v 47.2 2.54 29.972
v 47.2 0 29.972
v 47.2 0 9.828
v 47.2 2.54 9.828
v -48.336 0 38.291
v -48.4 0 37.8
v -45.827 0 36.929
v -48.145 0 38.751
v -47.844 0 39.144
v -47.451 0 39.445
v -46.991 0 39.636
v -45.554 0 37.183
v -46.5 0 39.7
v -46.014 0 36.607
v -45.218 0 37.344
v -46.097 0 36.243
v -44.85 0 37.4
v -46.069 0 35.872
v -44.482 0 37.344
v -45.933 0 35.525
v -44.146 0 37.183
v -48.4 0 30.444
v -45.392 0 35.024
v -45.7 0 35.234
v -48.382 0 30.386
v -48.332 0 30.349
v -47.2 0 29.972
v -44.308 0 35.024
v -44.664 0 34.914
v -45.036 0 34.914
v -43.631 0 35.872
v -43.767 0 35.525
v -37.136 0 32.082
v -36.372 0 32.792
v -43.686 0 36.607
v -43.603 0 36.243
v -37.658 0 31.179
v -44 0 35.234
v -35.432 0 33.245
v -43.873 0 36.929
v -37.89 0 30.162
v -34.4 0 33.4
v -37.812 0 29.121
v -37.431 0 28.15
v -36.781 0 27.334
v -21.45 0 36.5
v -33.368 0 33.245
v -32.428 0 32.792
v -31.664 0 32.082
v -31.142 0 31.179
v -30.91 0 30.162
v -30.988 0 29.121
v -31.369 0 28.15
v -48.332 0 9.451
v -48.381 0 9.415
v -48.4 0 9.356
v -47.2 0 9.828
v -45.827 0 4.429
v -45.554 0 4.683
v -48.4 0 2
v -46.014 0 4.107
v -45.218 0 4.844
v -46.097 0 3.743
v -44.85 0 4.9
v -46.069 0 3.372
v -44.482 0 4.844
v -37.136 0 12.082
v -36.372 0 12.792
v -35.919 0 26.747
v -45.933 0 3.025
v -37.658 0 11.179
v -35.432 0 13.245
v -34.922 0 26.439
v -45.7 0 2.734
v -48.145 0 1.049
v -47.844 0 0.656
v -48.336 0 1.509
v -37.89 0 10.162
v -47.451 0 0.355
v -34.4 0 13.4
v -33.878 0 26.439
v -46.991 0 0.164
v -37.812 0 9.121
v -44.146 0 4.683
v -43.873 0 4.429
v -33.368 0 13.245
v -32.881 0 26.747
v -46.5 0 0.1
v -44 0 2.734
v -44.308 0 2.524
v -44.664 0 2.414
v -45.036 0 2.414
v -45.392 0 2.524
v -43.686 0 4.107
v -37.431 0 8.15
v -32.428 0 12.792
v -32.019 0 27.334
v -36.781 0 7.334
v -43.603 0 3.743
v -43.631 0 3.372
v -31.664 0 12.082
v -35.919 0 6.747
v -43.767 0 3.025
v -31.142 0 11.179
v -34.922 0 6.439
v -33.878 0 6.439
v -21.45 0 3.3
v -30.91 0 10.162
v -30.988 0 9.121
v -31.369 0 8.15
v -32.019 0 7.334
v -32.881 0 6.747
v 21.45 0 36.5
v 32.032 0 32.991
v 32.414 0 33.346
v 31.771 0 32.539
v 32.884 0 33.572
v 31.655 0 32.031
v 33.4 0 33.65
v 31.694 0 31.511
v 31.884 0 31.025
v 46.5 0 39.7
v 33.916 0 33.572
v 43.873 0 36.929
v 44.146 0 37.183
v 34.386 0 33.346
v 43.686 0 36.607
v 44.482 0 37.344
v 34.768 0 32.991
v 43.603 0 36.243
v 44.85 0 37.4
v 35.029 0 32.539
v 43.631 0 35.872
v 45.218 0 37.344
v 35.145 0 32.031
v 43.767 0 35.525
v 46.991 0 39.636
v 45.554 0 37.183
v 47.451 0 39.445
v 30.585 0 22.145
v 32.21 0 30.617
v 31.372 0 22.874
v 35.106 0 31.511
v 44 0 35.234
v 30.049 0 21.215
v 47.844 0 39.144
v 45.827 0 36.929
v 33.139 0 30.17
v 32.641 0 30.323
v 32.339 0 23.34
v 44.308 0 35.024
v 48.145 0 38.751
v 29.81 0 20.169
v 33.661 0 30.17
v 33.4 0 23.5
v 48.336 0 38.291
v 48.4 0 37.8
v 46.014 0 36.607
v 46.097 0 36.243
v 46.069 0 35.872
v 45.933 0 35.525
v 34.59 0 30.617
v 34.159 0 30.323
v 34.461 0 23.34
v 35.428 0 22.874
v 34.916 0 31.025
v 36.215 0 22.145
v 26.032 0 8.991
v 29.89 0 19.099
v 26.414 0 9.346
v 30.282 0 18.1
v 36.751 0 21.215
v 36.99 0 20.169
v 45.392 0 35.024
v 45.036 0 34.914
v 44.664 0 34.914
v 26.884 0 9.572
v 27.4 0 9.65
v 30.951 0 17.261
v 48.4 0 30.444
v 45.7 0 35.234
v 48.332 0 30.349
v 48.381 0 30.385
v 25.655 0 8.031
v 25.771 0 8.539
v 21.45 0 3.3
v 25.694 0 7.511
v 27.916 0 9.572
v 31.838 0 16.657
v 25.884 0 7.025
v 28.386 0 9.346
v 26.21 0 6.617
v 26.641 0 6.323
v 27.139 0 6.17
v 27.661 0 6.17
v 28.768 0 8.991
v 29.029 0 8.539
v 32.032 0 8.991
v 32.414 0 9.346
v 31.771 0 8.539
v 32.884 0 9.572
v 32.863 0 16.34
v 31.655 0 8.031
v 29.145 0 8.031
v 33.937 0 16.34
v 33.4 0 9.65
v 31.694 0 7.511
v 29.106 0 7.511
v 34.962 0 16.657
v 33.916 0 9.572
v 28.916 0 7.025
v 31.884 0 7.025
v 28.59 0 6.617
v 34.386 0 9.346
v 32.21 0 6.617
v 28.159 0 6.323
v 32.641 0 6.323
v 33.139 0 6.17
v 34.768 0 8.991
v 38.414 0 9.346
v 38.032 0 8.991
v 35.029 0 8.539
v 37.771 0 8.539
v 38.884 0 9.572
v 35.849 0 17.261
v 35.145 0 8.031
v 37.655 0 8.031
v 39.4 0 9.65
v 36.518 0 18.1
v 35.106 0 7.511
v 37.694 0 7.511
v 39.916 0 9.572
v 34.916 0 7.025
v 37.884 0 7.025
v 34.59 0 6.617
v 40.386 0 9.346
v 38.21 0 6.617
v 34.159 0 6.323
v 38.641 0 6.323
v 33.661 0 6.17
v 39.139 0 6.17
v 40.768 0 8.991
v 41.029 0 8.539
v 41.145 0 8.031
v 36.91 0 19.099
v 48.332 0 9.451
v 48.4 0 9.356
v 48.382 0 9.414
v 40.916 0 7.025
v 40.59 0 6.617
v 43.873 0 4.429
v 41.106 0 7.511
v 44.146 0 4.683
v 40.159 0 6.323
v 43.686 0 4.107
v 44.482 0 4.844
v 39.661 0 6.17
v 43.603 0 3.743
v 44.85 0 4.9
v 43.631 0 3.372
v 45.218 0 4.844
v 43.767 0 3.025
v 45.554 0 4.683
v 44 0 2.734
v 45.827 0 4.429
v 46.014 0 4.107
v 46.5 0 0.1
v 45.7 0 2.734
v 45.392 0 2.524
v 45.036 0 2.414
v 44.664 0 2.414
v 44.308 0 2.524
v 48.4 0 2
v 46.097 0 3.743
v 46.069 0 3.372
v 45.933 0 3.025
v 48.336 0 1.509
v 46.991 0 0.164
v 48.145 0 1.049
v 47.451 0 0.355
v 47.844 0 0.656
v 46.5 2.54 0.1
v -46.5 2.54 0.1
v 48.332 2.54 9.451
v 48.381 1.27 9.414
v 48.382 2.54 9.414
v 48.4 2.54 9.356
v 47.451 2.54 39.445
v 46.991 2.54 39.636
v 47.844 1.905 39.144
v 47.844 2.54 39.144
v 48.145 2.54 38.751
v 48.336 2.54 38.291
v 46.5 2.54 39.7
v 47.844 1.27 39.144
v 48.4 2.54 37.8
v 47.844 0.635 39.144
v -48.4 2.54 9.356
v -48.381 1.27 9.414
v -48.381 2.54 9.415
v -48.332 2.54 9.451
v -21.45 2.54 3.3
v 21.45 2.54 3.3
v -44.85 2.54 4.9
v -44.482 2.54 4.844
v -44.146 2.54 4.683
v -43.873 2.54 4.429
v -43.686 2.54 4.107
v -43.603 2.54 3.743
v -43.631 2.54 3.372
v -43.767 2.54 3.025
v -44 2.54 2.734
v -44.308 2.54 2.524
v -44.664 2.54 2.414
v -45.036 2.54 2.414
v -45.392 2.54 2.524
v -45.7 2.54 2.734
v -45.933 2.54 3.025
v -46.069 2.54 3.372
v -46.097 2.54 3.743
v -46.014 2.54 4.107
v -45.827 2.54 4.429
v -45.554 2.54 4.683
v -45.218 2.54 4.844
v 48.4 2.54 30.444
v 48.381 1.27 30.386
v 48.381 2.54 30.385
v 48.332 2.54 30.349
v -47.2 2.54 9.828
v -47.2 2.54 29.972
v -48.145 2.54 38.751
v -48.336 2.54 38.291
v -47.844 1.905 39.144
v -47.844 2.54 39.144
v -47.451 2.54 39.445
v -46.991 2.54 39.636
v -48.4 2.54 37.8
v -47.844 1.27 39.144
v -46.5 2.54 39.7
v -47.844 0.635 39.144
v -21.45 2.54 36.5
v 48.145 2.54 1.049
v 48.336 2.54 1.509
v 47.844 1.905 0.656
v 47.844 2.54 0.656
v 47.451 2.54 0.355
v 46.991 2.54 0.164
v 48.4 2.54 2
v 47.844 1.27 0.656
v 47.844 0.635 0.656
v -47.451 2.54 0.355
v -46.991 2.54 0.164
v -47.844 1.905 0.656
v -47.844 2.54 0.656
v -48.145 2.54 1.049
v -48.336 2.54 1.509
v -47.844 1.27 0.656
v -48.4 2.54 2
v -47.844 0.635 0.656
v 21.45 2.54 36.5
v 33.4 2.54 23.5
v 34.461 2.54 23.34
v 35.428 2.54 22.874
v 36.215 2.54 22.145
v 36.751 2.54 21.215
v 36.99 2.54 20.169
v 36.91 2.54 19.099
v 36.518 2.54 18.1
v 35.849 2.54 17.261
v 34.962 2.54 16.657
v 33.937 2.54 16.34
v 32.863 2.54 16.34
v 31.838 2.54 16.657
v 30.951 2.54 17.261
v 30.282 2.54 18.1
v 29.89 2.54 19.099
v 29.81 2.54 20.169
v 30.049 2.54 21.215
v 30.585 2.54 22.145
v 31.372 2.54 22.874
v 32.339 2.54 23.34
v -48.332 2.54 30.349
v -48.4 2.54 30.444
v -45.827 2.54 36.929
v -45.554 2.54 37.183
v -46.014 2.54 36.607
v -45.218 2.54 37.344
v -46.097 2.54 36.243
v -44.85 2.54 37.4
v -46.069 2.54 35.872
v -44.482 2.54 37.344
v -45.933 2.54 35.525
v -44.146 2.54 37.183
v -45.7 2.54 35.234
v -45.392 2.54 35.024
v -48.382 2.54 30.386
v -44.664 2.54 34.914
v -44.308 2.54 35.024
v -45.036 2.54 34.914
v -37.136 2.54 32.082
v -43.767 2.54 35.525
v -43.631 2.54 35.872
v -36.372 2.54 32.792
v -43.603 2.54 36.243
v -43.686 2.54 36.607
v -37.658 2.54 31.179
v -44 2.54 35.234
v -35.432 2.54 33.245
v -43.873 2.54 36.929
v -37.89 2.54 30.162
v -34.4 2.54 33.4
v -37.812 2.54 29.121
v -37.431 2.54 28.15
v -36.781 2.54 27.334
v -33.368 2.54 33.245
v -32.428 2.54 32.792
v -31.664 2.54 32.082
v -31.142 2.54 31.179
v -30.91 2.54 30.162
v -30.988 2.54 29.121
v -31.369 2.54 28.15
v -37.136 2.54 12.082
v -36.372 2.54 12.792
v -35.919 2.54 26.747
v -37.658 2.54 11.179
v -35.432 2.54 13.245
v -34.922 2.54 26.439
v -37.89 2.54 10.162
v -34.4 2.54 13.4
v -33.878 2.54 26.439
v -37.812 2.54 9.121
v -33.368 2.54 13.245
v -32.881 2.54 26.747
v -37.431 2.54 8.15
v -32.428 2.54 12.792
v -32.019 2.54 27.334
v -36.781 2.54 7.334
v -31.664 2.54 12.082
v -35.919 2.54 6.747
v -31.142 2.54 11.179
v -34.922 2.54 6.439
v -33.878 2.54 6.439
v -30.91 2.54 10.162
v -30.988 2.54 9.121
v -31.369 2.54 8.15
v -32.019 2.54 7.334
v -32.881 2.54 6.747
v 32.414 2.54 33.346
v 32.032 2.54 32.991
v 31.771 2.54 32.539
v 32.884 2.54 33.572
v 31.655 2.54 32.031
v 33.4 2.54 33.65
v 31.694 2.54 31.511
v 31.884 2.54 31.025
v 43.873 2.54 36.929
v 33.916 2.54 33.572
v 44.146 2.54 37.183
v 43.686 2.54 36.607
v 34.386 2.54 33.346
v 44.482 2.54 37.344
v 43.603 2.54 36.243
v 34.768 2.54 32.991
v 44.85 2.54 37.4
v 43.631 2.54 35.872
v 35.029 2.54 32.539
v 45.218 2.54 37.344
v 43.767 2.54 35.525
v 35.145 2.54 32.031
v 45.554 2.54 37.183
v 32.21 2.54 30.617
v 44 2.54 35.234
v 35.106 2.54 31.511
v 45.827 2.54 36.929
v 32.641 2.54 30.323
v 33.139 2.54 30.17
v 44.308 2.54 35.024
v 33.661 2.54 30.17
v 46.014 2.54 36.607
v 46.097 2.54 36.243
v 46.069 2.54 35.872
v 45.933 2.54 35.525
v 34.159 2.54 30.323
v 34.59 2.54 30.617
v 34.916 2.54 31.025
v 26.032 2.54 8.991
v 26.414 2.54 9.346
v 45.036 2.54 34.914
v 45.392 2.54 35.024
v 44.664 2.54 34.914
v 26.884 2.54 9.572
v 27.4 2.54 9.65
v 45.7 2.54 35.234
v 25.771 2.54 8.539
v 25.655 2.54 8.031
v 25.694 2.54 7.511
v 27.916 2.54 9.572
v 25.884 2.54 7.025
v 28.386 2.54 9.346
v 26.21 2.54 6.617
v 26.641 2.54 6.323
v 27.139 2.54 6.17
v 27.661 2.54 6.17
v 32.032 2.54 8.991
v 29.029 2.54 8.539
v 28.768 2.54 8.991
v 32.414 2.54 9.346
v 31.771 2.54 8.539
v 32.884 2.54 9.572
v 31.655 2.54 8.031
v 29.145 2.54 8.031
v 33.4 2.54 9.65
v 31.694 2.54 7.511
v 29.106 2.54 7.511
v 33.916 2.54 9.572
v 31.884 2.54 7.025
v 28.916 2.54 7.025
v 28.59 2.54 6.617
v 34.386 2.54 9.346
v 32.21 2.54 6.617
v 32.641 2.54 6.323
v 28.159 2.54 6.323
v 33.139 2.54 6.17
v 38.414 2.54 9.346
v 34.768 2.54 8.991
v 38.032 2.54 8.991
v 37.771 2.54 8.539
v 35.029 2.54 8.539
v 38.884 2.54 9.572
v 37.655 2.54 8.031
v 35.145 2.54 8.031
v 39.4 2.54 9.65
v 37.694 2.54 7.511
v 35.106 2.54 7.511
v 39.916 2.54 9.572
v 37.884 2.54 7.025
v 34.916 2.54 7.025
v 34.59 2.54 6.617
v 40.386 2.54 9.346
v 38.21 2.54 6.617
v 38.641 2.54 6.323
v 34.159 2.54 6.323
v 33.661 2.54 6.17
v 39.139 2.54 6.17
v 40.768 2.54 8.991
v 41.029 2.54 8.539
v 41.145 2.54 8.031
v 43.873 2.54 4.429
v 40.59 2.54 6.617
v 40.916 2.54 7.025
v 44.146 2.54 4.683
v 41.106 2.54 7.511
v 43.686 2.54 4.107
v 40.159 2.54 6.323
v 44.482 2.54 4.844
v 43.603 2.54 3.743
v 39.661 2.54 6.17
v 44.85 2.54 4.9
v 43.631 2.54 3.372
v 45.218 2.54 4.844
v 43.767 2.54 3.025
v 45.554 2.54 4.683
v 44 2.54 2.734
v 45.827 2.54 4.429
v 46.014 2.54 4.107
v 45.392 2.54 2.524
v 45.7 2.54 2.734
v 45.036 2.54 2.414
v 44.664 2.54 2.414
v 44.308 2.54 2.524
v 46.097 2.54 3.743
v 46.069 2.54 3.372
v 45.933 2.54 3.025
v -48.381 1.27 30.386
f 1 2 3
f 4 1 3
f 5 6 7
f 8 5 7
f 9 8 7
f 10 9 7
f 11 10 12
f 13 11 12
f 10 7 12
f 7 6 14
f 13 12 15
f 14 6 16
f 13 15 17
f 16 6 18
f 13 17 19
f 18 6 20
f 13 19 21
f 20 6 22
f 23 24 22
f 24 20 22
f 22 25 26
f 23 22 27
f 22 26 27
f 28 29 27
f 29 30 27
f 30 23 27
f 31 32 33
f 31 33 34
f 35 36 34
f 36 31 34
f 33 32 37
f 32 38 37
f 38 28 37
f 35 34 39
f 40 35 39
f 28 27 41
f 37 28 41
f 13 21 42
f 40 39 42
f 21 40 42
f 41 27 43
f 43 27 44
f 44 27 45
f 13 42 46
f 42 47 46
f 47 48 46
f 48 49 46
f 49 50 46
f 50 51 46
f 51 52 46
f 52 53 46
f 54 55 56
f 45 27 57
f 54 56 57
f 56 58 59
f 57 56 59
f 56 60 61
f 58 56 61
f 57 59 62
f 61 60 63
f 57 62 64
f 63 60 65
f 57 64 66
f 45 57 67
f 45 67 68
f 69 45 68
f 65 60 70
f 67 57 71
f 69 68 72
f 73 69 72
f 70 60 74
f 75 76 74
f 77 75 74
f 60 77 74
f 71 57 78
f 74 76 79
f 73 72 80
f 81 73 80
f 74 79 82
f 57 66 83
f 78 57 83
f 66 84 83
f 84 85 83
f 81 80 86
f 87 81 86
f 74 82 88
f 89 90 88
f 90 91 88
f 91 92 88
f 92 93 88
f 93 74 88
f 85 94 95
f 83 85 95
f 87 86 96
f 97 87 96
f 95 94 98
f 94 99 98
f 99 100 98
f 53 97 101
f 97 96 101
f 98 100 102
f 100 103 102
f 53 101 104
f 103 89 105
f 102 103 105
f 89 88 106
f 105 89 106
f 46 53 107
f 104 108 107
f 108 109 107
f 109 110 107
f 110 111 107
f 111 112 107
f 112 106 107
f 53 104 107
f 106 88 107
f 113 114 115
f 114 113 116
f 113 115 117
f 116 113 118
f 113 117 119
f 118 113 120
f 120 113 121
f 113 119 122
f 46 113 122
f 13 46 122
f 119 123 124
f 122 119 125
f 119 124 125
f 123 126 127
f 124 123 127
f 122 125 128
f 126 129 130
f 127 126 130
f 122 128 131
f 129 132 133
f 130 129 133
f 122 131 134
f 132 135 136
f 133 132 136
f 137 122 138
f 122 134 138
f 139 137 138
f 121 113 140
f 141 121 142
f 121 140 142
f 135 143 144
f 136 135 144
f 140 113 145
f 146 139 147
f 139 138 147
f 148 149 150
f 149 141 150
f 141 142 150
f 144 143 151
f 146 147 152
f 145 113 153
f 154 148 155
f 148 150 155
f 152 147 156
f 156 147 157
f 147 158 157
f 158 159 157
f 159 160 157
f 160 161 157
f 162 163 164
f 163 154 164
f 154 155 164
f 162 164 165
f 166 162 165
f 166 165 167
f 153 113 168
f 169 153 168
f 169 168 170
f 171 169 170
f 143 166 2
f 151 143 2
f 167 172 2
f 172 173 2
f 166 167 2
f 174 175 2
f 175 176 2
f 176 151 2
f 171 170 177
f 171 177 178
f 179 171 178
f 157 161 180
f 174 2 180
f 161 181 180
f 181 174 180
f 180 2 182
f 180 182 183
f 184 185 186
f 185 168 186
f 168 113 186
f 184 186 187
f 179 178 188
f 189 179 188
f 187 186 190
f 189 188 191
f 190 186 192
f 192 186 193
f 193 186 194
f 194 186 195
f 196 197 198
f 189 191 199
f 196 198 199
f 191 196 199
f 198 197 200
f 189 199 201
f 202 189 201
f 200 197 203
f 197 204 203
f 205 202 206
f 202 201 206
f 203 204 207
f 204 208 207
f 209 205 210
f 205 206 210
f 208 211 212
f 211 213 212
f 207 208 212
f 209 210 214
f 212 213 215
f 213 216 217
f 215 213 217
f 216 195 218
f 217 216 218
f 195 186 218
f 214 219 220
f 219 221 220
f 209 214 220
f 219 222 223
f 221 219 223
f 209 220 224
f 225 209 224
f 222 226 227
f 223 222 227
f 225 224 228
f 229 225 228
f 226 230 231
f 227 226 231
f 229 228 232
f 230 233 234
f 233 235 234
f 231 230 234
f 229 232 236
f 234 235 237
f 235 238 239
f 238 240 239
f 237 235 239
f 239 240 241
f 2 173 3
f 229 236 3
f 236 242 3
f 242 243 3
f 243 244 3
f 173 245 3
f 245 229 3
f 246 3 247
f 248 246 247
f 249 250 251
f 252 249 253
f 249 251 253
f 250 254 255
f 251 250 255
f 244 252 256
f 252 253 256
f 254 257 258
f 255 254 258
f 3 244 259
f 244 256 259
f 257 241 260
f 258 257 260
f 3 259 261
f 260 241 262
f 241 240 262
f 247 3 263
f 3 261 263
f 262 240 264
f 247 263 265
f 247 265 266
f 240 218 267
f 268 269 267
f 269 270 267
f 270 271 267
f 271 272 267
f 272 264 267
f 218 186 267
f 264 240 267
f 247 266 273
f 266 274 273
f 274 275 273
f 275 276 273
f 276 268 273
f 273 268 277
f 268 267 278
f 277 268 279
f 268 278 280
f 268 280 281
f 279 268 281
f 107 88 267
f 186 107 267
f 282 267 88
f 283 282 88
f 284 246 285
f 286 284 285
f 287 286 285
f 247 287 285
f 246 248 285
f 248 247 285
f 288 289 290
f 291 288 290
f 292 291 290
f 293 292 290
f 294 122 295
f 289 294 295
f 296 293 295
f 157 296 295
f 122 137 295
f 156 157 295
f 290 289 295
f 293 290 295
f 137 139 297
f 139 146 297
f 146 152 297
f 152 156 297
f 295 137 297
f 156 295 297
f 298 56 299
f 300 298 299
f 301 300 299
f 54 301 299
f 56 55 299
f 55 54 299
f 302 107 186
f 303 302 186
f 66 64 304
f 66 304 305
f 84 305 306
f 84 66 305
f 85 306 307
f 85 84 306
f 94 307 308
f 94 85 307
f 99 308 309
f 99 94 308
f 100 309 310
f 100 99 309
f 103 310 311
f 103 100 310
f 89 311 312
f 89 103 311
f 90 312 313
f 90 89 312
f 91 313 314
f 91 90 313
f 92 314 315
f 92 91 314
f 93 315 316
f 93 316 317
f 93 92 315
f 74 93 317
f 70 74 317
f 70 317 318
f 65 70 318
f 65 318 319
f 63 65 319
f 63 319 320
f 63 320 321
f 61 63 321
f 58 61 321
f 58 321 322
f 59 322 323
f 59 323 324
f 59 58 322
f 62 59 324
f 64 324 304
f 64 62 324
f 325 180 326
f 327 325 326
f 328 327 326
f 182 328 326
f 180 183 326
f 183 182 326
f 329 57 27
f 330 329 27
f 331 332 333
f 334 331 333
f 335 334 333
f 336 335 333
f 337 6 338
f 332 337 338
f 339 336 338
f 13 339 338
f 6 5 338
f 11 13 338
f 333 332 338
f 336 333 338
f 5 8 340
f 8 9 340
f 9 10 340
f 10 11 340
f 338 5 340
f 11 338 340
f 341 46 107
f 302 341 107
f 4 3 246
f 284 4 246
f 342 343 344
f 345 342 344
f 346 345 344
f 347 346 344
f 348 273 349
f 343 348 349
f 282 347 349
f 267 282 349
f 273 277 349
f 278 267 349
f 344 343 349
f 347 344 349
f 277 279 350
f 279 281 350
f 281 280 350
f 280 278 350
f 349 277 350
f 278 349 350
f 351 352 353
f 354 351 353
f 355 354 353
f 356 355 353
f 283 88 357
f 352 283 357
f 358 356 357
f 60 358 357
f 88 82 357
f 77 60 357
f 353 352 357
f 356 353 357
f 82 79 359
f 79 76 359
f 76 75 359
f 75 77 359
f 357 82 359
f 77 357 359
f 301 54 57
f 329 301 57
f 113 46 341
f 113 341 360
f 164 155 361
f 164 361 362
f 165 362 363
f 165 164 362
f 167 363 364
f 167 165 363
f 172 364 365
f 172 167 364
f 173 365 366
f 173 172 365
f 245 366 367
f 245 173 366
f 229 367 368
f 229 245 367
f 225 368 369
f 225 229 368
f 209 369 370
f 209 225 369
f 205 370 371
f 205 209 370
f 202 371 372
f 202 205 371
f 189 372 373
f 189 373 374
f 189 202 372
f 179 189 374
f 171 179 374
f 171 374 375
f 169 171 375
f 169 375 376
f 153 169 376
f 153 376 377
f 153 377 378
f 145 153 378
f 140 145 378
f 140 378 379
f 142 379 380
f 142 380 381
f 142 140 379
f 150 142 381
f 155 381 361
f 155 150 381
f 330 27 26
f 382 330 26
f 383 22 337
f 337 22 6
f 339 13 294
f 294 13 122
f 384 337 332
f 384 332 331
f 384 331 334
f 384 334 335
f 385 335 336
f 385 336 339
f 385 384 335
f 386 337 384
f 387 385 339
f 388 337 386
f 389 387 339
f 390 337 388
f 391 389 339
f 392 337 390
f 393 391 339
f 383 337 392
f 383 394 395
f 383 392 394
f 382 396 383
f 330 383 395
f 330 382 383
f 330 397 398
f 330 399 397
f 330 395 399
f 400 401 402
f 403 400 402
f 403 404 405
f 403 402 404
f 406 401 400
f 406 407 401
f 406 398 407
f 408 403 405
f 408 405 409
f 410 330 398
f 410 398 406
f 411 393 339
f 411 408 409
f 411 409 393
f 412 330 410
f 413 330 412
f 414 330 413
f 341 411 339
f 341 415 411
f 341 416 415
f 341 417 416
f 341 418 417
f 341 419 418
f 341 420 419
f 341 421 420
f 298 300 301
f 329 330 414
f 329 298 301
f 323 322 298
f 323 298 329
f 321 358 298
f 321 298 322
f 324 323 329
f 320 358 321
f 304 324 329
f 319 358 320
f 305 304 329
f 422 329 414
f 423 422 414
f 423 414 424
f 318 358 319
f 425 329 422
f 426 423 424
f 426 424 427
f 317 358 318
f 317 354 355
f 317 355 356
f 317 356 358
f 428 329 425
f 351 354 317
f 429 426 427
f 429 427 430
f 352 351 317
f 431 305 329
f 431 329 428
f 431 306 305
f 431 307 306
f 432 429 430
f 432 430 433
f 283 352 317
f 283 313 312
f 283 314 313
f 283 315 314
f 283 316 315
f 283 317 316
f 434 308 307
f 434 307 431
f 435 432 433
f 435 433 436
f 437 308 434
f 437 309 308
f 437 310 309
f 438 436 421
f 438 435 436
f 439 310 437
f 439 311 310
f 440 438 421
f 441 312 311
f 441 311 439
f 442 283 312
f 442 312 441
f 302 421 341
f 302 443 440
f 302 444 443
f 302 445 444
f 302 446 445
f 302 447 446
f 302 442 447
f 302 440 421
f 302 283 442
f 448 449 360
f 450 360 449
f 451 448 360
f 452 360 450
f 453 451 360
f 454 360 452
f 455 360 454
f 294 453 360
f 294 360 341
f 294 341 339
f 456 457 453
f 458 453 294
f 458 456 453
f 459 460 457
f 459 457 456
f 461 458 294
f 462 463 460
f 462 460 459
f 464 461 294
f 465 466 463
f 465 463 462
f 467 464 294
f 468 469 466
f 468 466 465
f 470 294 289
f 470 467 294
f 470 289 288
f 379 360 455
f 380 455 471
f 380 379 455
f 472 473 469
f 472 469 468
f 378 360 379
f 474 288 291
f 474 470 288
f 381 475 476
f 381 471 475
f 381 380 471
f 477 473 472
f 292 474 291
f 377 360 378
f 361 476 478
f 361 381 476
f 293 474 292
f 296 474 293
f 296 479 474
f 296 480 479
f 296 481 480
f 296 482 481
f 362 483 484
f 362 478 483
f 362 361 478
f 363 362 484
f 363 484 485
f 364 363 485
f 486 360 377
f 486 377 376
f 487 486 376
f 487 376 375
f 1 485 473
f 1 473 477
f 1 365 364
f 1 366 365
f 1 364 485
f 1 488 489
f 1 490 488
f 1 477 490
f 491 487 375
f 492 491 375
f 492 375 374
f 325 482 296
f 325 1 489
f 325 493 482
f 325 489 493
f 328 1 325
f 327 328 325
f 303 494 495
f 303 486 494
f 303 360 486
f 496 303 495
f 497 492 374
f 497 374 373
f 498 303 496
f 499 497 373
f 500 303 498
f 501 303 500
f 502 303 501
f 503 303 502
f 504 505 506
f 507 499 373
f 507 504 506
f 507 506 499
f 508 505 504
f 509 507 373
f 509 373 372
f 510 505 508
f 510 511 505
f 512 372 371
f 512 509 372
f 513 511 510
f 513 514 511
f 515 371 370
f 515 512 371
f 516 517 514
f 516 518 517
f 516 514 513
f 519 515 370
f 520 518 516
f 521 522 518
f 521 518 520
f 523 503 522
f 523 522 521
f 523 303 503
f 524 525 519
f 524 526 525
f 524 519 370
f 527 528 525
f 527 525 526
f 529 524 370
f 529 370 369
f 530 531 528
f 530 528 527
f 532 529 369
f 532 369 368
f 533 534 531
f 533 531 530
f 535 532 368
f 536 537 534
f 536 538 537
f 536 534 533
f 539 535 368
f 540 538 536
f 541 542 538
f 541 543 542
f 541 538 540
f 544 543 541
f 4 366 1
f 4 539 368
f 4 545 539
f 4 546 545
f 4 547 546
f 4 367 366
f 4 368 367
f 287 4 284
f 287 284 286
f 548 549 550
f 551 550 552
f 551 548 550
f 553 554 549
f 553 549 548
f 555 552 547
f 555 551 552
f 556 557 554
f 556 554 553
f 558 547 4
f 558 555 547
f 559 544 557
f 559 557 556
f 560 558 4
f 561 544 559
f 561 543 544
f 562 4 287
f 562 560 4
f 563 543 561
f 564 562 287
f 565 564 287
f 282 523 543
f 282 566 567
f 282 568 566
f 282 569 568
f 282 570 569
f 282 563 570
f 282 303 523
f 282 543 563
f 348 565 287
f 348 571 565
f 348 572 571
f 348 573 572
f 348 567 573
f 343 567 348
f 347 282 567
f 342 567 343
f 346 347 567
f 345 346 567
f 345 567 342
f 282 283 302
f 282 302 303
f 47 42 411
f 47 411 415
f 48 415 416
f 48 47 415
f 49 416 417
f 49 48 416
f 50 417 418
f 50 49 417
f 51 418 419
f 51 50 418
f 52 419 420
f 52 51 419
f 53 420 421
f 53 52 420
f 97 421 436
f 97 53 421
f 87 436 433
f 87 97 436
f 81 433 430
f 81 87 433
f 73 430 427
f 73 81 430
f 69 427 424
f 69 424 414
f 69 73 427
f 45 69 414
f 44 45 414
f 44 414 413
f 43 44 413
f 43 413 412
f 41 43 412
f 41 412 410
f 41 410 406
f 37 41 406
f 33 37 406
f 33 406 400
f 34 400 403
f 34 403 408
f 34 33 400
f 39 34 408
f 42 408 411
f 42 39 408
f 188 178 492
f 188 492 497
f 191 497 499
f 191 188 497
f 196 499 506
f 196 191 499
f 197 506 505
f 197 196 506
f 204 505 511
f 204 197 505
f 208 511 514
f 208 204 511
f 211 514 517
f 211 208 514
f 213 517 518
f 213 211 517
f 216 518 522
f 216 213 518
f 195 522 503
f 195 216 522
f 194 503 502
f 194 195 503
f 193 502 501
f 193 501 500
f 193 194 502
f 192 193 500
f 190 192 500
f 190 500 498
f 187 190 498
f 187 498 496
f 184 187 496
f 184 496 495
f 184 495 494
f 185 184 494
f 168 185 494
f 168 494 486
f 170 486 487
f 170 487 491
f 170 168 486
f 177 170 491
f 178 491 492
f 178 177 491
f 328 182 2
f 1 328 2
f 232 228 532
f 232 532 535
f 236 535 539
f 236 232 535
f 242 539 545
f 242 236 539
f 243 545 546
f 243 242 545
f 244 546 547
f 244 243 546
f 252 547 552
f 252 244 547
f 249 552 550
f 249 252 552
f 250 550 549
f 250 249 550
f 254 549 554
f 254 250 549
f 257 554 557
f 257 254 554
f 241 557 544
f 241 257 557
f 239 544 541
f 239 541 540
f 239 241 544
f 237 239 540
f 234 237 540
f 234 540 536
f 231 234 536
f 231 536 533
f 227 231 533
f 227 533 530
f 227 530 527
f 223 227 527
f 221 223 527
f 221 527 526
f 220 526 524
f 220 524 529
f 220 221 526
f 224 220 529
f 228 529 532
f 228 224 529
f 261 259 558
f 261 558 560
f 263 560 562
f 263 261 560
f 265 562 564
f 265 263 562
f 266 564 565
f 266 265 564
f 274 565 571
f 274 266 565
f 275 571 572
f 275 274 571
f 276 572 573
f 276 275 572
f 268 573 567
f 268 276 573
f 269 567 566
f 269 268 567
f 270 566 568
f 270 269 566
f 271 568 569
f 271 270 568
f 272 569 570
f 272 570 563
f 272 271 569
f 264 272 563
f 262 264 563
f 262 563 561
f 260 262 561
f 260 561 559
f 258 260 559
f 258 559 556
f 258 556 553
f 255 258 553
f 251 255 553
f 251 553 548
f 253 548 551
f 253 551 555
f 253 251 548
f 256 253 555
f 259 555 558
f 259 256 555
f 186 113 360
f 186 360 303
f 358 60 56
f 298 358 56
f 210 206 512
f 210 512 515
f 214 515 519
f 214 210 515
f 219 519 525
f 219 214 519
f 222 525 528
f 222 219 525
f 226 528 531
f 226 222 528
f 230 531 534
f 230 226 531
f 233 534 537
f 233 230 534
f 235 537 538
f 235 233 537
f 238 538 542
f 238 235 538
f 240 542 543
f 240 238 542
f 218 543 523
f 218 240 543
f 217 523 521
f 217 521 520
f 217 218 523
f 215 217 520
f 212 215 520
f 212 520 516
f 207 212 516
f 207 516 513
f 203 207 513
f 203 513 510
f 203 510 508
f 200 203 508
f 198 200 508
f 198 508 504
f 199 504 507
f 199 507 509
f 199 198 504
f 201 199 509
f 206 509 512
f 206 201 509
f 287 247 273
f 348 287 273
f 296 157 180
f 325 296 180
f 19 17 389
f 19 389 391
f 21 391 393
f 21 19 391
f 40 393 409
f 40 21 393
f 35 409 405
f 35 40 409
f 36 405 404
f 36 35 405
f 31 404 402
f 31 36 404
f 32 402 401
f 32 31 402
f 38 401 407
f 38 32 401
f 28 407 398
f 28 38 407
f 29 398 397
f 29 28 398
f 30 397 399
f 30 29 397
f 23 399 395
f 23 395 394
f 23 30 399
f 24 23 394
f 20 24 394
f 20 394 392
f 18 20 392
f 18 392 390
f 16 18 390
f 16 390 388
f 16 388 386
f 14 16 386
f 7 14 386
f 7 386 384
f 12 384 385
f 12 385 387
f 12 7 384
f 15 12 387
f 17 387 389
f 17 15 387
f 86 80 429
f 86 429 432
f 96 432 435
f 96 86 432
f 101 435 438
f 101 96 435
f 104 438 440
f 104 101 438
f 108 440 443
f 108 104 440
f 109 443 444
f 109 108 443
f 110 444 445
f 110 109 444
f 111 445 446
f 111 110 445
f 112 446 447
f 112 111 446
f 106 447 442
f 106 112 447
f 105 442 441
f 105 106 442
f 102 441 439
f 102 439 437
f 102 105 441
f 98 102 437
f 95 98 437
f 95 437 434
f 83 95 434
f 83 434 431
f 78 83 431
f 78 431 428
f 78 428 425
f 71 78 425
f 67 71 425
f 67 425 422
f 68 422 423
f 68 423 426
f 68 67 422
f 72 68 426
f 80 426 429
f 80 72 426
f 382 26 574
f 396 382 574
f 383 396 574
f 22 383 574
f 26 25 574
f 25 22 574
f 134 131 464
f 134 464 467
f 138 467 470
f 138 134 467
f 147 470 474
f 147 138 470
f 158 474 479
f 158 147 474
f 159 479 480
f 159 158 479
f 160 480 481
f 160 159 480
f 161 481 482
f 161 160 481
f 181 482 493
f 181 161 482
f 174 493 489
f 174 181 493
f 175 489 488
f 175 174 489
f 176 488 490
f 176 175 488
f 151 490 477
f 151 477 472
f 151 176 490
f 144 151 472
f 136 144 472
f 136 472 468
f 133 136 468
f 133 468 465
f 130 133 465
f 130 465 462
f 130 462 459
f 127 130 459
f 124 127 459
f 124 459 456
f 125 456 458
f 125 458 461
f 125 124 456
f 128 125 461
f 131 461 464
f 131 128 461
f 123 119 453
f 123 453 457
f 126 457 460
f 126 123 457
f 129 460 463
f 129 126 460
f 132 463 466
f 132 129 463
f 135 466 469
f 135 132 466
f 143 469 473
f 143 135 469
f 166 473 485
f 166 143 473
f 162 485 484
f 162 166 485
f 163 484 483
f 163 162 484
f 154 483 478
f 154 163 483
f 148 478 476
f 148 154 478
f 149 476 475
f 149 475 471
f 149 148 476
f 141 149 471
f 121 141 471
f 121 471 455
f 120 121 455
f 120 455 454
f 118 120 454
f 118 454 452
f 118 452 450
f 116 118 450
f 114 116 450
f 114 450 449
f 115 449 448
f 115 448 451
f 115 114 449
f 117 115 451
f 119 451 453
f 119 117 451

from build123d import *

# Parameters (mm, degrees)
SKETCH_1_R      = 3.5
SKETCH_1_R_2    = 3.6
SKETCH_1_R_3    = 1.249999971
SKETCH_1_R_4    = 1.75
SKETCH_1_W      = 42.9
SKETCH_1_H      = 33.2
EXTRUDE_1_DEPTH = 2.54


with BuildPart() as part:
    # 草图1 → 凸台-拉伸1 (new body)
    with BuildSketch(Plane(origin=(0, 0, 0), x_dir=(1, 0, 0), z_dir=(0, 1, 0))):
        with BuildLine():
            Line((48.4, -37.799999853), (48.4, -30.444151853))
            add(Edge.make_bspline(
                [(48.4, -30.444151853), (48.4, -30.412185559), (48.381122931, -30.385679038), (48.362542068, -30.359588441), (48.331618599, -30.349282131)],
                knots=[0, 0, 0, 0.5, 0.5, 1, 1, 1], degree=2))
            Line((48.331618599, -30.349282131), (47.2, -29.972075797))
            Line((47.2, -29.972075797), (47.2, -9.827924497))
            Line((47.2, -9.827924497), (48.331621786, -9.450717896))
            add(Edge.make_bspline(
                [(48.331621786, -9.450717896), (48.361949426, -9.440608674), (48.381126465, -9.414316076), (48.400002612, -9.388436014), (48.399998982, -9.35583844)],
                knots=[0, 0, 0, 0.5, 0.5, 1, 1, 1], degree=2))
            Line((48.399998982, -9.35583844), (48.399998982, -2.000000147))
            add(Edge.make_bspline(
                [(48.399998982, -2.000000147), (48.399998982, -1.622352729), (48.255370094, -1.272901625), (48.11105262, -0.924202959), (47.843501866, -0.656497263), (47.576728704, -0.389569608), (47.227097503, -0.244629035), (46.878218161, -0.100000147), (46.499998982, -0.100000147)],
                knots=[0, 0, 0, 0.25, 0.25, 0.5, 0.5, 0.75, 0.75, 1, 1, 1], degree=2))
            Line((46.499998982, -0.100000147), (-46.499999902, -0.100000147))
            add(Edge.make_bspline(
                [(-46.499999902, -0.100000147), (-46.87764732, -0.100000147), (-47.227098424, -0.244629035), (-47.575797089, -0.388946508), (-47.843502786, -0.656497263), (-48.110430441, -0.923270425), (-48.255371014, -1.272901625), (-48.399999902, -1.621780968), (-48.399999902, -2.000000147)],
                knots=[0, 0, 0, 0.25, 0.25, 0.5, 0.5, 0.75, 0.75, 1, 1, 1], degree=2))
            Line((-48.399999902, -2.000000147), (-48.399999902, -9.355848147))
            add(Edge.make_bspline(
                [(-48.399999902, -9.355848147), (-48.399999902, -9.387814441), (-48.381122833, -9.414320961), (-48.362541971, -9.440411559), (-48.331618501, -9.450717869)],
                knots=[0, 0, 0, 0.5, 0.5, 1, 1, 1], degree=2))
            Line((-48.331618501, -9.450717869), (-47.199999902, -9.827924203))
            Line((-47.199999902, -9.827924203), (-47.199999902, -29.97207609))
            Line((-47.199999902, -29.97207609), (-48.331620003, -30.349282599))
            add(Edge.make_bspline(
                [(-48.331620003, -30.349282599), (-48.361947916, -30.359391659), (-48.381125177, -30.385684352), (-48.400001544, -30.411564511), (-48.399997915, -30.444162293)],
                knots=[0, 0, 0, 0.5, 0.5, 1, 1, 1], degree=2))
            Line((-48.399997915, -30.444162293), (-48.4, -37.799999853))
            add(Edge.make_bspline(
                [(-48.4, -37.799999853), (-48.4, -38.177647271), (-48.255371112, -38.527098375), (-48.111053639, -38.875797041), (-47.843502884, -39.143502737), (-47.576729722, -39.410430392), (-47.227098521, -39.555370965), (-46.878219179, -39.699999853), (-46.5, -39.699999853)],
                knots=[0, 0, 0, 0.25, 0.25, 0.5, 0.5, 0.75, 0.75, 1, 1, 1], degree=2))
            Line((-46.5, -39.699999853), (46.5, -39.699999853))
            add(Edge.make_bspline(
                [(46.5, -39.699999853), (46.877647417, -39.699999853), (47.227098521, -39.555370965), (47.575797187, -39.411053492), (47.843502884, -39.143502737), (48.110430539, -38.876729575), (48.255371112, -38.527098375), (48.4, -38.178219032), (48.4, -37.799999853)],
                knots=[0, 0, 0, 0.25, 0.25, 0.5, 0.5, 0.75, 0.75, 1, 1, 1], degree=2))
        make_face()
        with Locations(Location((-34.399999902, -9.900000147, 0), (0, 0, 270))):
            Circle(SKETCH_1_R, mode=Mode.SUBTRACT)
        with Locations(Location((-34.399999902, -29.900000147, 0), (0, 0, 270))):
            Circle(SKETCH_1_R, mode=Mode.SUBTRACT)
        with Locations(Location((33.399998982, -19.9, 0), (0, 0, 270))):
            Circle(SKETCH_1_R_2, mode=Mode.SUBTRACT)
        with Locations(Location((-44.85, -36.15, 0), (0, 0, 270))):
            Circle(SKETCH_1_R_3, mode=Mode.SUBTRACT)
        with Locations(Location((44.85, -36.15, 0), (0, 0, 270))):
            Circle(SKETCH_1_R_3, mode=Mode.SUBTRACT)
        with Locations(Location((27.399998982, -7.899999853, 0), (0, 0, 270))):
            Circle(SKETCH_1_R_4, mode=Mode.SUBTRACT)
        with Locations(Location((-44.85, -3.65, 0), (0, 0, 270))):
            Circle(SKETCH_1_R_3, mode=Mode.SUBTRACT)
        with Locations(Location((44.85, -3.65, 0), (0, 0, 270))):
            Circle(SKETCH_1_R_3, mode=Mode.SUBTRACT)
        with Locations(Location((39.399998982, -7.899999853, 0), (0, 0, 270))):
            Circle(SKETCH_1_R_4, mode=Mode.SUBTRACT)
        with Locations(Location((33.399998982, -31.90000044, 0), (0, 0, 270))):
            Circle(SKETCH_1_R_4, mode=Mode.SUBTRACT)
        with Locations(Location((33.399998982, -7.899999853, 0), (0, 0, 270))):
            Circle(SKETCH_1_R_4, mode=Mode.SUBTRACT)
        with Locations((0, -19.900000147)):
            Rectangle(SKETCH_1_W, SKETCH_1_H, mode=Mode.SUBTRACT)
    extrude(amount=EXTRUDE_1_DEPTH)


solid = part.part
